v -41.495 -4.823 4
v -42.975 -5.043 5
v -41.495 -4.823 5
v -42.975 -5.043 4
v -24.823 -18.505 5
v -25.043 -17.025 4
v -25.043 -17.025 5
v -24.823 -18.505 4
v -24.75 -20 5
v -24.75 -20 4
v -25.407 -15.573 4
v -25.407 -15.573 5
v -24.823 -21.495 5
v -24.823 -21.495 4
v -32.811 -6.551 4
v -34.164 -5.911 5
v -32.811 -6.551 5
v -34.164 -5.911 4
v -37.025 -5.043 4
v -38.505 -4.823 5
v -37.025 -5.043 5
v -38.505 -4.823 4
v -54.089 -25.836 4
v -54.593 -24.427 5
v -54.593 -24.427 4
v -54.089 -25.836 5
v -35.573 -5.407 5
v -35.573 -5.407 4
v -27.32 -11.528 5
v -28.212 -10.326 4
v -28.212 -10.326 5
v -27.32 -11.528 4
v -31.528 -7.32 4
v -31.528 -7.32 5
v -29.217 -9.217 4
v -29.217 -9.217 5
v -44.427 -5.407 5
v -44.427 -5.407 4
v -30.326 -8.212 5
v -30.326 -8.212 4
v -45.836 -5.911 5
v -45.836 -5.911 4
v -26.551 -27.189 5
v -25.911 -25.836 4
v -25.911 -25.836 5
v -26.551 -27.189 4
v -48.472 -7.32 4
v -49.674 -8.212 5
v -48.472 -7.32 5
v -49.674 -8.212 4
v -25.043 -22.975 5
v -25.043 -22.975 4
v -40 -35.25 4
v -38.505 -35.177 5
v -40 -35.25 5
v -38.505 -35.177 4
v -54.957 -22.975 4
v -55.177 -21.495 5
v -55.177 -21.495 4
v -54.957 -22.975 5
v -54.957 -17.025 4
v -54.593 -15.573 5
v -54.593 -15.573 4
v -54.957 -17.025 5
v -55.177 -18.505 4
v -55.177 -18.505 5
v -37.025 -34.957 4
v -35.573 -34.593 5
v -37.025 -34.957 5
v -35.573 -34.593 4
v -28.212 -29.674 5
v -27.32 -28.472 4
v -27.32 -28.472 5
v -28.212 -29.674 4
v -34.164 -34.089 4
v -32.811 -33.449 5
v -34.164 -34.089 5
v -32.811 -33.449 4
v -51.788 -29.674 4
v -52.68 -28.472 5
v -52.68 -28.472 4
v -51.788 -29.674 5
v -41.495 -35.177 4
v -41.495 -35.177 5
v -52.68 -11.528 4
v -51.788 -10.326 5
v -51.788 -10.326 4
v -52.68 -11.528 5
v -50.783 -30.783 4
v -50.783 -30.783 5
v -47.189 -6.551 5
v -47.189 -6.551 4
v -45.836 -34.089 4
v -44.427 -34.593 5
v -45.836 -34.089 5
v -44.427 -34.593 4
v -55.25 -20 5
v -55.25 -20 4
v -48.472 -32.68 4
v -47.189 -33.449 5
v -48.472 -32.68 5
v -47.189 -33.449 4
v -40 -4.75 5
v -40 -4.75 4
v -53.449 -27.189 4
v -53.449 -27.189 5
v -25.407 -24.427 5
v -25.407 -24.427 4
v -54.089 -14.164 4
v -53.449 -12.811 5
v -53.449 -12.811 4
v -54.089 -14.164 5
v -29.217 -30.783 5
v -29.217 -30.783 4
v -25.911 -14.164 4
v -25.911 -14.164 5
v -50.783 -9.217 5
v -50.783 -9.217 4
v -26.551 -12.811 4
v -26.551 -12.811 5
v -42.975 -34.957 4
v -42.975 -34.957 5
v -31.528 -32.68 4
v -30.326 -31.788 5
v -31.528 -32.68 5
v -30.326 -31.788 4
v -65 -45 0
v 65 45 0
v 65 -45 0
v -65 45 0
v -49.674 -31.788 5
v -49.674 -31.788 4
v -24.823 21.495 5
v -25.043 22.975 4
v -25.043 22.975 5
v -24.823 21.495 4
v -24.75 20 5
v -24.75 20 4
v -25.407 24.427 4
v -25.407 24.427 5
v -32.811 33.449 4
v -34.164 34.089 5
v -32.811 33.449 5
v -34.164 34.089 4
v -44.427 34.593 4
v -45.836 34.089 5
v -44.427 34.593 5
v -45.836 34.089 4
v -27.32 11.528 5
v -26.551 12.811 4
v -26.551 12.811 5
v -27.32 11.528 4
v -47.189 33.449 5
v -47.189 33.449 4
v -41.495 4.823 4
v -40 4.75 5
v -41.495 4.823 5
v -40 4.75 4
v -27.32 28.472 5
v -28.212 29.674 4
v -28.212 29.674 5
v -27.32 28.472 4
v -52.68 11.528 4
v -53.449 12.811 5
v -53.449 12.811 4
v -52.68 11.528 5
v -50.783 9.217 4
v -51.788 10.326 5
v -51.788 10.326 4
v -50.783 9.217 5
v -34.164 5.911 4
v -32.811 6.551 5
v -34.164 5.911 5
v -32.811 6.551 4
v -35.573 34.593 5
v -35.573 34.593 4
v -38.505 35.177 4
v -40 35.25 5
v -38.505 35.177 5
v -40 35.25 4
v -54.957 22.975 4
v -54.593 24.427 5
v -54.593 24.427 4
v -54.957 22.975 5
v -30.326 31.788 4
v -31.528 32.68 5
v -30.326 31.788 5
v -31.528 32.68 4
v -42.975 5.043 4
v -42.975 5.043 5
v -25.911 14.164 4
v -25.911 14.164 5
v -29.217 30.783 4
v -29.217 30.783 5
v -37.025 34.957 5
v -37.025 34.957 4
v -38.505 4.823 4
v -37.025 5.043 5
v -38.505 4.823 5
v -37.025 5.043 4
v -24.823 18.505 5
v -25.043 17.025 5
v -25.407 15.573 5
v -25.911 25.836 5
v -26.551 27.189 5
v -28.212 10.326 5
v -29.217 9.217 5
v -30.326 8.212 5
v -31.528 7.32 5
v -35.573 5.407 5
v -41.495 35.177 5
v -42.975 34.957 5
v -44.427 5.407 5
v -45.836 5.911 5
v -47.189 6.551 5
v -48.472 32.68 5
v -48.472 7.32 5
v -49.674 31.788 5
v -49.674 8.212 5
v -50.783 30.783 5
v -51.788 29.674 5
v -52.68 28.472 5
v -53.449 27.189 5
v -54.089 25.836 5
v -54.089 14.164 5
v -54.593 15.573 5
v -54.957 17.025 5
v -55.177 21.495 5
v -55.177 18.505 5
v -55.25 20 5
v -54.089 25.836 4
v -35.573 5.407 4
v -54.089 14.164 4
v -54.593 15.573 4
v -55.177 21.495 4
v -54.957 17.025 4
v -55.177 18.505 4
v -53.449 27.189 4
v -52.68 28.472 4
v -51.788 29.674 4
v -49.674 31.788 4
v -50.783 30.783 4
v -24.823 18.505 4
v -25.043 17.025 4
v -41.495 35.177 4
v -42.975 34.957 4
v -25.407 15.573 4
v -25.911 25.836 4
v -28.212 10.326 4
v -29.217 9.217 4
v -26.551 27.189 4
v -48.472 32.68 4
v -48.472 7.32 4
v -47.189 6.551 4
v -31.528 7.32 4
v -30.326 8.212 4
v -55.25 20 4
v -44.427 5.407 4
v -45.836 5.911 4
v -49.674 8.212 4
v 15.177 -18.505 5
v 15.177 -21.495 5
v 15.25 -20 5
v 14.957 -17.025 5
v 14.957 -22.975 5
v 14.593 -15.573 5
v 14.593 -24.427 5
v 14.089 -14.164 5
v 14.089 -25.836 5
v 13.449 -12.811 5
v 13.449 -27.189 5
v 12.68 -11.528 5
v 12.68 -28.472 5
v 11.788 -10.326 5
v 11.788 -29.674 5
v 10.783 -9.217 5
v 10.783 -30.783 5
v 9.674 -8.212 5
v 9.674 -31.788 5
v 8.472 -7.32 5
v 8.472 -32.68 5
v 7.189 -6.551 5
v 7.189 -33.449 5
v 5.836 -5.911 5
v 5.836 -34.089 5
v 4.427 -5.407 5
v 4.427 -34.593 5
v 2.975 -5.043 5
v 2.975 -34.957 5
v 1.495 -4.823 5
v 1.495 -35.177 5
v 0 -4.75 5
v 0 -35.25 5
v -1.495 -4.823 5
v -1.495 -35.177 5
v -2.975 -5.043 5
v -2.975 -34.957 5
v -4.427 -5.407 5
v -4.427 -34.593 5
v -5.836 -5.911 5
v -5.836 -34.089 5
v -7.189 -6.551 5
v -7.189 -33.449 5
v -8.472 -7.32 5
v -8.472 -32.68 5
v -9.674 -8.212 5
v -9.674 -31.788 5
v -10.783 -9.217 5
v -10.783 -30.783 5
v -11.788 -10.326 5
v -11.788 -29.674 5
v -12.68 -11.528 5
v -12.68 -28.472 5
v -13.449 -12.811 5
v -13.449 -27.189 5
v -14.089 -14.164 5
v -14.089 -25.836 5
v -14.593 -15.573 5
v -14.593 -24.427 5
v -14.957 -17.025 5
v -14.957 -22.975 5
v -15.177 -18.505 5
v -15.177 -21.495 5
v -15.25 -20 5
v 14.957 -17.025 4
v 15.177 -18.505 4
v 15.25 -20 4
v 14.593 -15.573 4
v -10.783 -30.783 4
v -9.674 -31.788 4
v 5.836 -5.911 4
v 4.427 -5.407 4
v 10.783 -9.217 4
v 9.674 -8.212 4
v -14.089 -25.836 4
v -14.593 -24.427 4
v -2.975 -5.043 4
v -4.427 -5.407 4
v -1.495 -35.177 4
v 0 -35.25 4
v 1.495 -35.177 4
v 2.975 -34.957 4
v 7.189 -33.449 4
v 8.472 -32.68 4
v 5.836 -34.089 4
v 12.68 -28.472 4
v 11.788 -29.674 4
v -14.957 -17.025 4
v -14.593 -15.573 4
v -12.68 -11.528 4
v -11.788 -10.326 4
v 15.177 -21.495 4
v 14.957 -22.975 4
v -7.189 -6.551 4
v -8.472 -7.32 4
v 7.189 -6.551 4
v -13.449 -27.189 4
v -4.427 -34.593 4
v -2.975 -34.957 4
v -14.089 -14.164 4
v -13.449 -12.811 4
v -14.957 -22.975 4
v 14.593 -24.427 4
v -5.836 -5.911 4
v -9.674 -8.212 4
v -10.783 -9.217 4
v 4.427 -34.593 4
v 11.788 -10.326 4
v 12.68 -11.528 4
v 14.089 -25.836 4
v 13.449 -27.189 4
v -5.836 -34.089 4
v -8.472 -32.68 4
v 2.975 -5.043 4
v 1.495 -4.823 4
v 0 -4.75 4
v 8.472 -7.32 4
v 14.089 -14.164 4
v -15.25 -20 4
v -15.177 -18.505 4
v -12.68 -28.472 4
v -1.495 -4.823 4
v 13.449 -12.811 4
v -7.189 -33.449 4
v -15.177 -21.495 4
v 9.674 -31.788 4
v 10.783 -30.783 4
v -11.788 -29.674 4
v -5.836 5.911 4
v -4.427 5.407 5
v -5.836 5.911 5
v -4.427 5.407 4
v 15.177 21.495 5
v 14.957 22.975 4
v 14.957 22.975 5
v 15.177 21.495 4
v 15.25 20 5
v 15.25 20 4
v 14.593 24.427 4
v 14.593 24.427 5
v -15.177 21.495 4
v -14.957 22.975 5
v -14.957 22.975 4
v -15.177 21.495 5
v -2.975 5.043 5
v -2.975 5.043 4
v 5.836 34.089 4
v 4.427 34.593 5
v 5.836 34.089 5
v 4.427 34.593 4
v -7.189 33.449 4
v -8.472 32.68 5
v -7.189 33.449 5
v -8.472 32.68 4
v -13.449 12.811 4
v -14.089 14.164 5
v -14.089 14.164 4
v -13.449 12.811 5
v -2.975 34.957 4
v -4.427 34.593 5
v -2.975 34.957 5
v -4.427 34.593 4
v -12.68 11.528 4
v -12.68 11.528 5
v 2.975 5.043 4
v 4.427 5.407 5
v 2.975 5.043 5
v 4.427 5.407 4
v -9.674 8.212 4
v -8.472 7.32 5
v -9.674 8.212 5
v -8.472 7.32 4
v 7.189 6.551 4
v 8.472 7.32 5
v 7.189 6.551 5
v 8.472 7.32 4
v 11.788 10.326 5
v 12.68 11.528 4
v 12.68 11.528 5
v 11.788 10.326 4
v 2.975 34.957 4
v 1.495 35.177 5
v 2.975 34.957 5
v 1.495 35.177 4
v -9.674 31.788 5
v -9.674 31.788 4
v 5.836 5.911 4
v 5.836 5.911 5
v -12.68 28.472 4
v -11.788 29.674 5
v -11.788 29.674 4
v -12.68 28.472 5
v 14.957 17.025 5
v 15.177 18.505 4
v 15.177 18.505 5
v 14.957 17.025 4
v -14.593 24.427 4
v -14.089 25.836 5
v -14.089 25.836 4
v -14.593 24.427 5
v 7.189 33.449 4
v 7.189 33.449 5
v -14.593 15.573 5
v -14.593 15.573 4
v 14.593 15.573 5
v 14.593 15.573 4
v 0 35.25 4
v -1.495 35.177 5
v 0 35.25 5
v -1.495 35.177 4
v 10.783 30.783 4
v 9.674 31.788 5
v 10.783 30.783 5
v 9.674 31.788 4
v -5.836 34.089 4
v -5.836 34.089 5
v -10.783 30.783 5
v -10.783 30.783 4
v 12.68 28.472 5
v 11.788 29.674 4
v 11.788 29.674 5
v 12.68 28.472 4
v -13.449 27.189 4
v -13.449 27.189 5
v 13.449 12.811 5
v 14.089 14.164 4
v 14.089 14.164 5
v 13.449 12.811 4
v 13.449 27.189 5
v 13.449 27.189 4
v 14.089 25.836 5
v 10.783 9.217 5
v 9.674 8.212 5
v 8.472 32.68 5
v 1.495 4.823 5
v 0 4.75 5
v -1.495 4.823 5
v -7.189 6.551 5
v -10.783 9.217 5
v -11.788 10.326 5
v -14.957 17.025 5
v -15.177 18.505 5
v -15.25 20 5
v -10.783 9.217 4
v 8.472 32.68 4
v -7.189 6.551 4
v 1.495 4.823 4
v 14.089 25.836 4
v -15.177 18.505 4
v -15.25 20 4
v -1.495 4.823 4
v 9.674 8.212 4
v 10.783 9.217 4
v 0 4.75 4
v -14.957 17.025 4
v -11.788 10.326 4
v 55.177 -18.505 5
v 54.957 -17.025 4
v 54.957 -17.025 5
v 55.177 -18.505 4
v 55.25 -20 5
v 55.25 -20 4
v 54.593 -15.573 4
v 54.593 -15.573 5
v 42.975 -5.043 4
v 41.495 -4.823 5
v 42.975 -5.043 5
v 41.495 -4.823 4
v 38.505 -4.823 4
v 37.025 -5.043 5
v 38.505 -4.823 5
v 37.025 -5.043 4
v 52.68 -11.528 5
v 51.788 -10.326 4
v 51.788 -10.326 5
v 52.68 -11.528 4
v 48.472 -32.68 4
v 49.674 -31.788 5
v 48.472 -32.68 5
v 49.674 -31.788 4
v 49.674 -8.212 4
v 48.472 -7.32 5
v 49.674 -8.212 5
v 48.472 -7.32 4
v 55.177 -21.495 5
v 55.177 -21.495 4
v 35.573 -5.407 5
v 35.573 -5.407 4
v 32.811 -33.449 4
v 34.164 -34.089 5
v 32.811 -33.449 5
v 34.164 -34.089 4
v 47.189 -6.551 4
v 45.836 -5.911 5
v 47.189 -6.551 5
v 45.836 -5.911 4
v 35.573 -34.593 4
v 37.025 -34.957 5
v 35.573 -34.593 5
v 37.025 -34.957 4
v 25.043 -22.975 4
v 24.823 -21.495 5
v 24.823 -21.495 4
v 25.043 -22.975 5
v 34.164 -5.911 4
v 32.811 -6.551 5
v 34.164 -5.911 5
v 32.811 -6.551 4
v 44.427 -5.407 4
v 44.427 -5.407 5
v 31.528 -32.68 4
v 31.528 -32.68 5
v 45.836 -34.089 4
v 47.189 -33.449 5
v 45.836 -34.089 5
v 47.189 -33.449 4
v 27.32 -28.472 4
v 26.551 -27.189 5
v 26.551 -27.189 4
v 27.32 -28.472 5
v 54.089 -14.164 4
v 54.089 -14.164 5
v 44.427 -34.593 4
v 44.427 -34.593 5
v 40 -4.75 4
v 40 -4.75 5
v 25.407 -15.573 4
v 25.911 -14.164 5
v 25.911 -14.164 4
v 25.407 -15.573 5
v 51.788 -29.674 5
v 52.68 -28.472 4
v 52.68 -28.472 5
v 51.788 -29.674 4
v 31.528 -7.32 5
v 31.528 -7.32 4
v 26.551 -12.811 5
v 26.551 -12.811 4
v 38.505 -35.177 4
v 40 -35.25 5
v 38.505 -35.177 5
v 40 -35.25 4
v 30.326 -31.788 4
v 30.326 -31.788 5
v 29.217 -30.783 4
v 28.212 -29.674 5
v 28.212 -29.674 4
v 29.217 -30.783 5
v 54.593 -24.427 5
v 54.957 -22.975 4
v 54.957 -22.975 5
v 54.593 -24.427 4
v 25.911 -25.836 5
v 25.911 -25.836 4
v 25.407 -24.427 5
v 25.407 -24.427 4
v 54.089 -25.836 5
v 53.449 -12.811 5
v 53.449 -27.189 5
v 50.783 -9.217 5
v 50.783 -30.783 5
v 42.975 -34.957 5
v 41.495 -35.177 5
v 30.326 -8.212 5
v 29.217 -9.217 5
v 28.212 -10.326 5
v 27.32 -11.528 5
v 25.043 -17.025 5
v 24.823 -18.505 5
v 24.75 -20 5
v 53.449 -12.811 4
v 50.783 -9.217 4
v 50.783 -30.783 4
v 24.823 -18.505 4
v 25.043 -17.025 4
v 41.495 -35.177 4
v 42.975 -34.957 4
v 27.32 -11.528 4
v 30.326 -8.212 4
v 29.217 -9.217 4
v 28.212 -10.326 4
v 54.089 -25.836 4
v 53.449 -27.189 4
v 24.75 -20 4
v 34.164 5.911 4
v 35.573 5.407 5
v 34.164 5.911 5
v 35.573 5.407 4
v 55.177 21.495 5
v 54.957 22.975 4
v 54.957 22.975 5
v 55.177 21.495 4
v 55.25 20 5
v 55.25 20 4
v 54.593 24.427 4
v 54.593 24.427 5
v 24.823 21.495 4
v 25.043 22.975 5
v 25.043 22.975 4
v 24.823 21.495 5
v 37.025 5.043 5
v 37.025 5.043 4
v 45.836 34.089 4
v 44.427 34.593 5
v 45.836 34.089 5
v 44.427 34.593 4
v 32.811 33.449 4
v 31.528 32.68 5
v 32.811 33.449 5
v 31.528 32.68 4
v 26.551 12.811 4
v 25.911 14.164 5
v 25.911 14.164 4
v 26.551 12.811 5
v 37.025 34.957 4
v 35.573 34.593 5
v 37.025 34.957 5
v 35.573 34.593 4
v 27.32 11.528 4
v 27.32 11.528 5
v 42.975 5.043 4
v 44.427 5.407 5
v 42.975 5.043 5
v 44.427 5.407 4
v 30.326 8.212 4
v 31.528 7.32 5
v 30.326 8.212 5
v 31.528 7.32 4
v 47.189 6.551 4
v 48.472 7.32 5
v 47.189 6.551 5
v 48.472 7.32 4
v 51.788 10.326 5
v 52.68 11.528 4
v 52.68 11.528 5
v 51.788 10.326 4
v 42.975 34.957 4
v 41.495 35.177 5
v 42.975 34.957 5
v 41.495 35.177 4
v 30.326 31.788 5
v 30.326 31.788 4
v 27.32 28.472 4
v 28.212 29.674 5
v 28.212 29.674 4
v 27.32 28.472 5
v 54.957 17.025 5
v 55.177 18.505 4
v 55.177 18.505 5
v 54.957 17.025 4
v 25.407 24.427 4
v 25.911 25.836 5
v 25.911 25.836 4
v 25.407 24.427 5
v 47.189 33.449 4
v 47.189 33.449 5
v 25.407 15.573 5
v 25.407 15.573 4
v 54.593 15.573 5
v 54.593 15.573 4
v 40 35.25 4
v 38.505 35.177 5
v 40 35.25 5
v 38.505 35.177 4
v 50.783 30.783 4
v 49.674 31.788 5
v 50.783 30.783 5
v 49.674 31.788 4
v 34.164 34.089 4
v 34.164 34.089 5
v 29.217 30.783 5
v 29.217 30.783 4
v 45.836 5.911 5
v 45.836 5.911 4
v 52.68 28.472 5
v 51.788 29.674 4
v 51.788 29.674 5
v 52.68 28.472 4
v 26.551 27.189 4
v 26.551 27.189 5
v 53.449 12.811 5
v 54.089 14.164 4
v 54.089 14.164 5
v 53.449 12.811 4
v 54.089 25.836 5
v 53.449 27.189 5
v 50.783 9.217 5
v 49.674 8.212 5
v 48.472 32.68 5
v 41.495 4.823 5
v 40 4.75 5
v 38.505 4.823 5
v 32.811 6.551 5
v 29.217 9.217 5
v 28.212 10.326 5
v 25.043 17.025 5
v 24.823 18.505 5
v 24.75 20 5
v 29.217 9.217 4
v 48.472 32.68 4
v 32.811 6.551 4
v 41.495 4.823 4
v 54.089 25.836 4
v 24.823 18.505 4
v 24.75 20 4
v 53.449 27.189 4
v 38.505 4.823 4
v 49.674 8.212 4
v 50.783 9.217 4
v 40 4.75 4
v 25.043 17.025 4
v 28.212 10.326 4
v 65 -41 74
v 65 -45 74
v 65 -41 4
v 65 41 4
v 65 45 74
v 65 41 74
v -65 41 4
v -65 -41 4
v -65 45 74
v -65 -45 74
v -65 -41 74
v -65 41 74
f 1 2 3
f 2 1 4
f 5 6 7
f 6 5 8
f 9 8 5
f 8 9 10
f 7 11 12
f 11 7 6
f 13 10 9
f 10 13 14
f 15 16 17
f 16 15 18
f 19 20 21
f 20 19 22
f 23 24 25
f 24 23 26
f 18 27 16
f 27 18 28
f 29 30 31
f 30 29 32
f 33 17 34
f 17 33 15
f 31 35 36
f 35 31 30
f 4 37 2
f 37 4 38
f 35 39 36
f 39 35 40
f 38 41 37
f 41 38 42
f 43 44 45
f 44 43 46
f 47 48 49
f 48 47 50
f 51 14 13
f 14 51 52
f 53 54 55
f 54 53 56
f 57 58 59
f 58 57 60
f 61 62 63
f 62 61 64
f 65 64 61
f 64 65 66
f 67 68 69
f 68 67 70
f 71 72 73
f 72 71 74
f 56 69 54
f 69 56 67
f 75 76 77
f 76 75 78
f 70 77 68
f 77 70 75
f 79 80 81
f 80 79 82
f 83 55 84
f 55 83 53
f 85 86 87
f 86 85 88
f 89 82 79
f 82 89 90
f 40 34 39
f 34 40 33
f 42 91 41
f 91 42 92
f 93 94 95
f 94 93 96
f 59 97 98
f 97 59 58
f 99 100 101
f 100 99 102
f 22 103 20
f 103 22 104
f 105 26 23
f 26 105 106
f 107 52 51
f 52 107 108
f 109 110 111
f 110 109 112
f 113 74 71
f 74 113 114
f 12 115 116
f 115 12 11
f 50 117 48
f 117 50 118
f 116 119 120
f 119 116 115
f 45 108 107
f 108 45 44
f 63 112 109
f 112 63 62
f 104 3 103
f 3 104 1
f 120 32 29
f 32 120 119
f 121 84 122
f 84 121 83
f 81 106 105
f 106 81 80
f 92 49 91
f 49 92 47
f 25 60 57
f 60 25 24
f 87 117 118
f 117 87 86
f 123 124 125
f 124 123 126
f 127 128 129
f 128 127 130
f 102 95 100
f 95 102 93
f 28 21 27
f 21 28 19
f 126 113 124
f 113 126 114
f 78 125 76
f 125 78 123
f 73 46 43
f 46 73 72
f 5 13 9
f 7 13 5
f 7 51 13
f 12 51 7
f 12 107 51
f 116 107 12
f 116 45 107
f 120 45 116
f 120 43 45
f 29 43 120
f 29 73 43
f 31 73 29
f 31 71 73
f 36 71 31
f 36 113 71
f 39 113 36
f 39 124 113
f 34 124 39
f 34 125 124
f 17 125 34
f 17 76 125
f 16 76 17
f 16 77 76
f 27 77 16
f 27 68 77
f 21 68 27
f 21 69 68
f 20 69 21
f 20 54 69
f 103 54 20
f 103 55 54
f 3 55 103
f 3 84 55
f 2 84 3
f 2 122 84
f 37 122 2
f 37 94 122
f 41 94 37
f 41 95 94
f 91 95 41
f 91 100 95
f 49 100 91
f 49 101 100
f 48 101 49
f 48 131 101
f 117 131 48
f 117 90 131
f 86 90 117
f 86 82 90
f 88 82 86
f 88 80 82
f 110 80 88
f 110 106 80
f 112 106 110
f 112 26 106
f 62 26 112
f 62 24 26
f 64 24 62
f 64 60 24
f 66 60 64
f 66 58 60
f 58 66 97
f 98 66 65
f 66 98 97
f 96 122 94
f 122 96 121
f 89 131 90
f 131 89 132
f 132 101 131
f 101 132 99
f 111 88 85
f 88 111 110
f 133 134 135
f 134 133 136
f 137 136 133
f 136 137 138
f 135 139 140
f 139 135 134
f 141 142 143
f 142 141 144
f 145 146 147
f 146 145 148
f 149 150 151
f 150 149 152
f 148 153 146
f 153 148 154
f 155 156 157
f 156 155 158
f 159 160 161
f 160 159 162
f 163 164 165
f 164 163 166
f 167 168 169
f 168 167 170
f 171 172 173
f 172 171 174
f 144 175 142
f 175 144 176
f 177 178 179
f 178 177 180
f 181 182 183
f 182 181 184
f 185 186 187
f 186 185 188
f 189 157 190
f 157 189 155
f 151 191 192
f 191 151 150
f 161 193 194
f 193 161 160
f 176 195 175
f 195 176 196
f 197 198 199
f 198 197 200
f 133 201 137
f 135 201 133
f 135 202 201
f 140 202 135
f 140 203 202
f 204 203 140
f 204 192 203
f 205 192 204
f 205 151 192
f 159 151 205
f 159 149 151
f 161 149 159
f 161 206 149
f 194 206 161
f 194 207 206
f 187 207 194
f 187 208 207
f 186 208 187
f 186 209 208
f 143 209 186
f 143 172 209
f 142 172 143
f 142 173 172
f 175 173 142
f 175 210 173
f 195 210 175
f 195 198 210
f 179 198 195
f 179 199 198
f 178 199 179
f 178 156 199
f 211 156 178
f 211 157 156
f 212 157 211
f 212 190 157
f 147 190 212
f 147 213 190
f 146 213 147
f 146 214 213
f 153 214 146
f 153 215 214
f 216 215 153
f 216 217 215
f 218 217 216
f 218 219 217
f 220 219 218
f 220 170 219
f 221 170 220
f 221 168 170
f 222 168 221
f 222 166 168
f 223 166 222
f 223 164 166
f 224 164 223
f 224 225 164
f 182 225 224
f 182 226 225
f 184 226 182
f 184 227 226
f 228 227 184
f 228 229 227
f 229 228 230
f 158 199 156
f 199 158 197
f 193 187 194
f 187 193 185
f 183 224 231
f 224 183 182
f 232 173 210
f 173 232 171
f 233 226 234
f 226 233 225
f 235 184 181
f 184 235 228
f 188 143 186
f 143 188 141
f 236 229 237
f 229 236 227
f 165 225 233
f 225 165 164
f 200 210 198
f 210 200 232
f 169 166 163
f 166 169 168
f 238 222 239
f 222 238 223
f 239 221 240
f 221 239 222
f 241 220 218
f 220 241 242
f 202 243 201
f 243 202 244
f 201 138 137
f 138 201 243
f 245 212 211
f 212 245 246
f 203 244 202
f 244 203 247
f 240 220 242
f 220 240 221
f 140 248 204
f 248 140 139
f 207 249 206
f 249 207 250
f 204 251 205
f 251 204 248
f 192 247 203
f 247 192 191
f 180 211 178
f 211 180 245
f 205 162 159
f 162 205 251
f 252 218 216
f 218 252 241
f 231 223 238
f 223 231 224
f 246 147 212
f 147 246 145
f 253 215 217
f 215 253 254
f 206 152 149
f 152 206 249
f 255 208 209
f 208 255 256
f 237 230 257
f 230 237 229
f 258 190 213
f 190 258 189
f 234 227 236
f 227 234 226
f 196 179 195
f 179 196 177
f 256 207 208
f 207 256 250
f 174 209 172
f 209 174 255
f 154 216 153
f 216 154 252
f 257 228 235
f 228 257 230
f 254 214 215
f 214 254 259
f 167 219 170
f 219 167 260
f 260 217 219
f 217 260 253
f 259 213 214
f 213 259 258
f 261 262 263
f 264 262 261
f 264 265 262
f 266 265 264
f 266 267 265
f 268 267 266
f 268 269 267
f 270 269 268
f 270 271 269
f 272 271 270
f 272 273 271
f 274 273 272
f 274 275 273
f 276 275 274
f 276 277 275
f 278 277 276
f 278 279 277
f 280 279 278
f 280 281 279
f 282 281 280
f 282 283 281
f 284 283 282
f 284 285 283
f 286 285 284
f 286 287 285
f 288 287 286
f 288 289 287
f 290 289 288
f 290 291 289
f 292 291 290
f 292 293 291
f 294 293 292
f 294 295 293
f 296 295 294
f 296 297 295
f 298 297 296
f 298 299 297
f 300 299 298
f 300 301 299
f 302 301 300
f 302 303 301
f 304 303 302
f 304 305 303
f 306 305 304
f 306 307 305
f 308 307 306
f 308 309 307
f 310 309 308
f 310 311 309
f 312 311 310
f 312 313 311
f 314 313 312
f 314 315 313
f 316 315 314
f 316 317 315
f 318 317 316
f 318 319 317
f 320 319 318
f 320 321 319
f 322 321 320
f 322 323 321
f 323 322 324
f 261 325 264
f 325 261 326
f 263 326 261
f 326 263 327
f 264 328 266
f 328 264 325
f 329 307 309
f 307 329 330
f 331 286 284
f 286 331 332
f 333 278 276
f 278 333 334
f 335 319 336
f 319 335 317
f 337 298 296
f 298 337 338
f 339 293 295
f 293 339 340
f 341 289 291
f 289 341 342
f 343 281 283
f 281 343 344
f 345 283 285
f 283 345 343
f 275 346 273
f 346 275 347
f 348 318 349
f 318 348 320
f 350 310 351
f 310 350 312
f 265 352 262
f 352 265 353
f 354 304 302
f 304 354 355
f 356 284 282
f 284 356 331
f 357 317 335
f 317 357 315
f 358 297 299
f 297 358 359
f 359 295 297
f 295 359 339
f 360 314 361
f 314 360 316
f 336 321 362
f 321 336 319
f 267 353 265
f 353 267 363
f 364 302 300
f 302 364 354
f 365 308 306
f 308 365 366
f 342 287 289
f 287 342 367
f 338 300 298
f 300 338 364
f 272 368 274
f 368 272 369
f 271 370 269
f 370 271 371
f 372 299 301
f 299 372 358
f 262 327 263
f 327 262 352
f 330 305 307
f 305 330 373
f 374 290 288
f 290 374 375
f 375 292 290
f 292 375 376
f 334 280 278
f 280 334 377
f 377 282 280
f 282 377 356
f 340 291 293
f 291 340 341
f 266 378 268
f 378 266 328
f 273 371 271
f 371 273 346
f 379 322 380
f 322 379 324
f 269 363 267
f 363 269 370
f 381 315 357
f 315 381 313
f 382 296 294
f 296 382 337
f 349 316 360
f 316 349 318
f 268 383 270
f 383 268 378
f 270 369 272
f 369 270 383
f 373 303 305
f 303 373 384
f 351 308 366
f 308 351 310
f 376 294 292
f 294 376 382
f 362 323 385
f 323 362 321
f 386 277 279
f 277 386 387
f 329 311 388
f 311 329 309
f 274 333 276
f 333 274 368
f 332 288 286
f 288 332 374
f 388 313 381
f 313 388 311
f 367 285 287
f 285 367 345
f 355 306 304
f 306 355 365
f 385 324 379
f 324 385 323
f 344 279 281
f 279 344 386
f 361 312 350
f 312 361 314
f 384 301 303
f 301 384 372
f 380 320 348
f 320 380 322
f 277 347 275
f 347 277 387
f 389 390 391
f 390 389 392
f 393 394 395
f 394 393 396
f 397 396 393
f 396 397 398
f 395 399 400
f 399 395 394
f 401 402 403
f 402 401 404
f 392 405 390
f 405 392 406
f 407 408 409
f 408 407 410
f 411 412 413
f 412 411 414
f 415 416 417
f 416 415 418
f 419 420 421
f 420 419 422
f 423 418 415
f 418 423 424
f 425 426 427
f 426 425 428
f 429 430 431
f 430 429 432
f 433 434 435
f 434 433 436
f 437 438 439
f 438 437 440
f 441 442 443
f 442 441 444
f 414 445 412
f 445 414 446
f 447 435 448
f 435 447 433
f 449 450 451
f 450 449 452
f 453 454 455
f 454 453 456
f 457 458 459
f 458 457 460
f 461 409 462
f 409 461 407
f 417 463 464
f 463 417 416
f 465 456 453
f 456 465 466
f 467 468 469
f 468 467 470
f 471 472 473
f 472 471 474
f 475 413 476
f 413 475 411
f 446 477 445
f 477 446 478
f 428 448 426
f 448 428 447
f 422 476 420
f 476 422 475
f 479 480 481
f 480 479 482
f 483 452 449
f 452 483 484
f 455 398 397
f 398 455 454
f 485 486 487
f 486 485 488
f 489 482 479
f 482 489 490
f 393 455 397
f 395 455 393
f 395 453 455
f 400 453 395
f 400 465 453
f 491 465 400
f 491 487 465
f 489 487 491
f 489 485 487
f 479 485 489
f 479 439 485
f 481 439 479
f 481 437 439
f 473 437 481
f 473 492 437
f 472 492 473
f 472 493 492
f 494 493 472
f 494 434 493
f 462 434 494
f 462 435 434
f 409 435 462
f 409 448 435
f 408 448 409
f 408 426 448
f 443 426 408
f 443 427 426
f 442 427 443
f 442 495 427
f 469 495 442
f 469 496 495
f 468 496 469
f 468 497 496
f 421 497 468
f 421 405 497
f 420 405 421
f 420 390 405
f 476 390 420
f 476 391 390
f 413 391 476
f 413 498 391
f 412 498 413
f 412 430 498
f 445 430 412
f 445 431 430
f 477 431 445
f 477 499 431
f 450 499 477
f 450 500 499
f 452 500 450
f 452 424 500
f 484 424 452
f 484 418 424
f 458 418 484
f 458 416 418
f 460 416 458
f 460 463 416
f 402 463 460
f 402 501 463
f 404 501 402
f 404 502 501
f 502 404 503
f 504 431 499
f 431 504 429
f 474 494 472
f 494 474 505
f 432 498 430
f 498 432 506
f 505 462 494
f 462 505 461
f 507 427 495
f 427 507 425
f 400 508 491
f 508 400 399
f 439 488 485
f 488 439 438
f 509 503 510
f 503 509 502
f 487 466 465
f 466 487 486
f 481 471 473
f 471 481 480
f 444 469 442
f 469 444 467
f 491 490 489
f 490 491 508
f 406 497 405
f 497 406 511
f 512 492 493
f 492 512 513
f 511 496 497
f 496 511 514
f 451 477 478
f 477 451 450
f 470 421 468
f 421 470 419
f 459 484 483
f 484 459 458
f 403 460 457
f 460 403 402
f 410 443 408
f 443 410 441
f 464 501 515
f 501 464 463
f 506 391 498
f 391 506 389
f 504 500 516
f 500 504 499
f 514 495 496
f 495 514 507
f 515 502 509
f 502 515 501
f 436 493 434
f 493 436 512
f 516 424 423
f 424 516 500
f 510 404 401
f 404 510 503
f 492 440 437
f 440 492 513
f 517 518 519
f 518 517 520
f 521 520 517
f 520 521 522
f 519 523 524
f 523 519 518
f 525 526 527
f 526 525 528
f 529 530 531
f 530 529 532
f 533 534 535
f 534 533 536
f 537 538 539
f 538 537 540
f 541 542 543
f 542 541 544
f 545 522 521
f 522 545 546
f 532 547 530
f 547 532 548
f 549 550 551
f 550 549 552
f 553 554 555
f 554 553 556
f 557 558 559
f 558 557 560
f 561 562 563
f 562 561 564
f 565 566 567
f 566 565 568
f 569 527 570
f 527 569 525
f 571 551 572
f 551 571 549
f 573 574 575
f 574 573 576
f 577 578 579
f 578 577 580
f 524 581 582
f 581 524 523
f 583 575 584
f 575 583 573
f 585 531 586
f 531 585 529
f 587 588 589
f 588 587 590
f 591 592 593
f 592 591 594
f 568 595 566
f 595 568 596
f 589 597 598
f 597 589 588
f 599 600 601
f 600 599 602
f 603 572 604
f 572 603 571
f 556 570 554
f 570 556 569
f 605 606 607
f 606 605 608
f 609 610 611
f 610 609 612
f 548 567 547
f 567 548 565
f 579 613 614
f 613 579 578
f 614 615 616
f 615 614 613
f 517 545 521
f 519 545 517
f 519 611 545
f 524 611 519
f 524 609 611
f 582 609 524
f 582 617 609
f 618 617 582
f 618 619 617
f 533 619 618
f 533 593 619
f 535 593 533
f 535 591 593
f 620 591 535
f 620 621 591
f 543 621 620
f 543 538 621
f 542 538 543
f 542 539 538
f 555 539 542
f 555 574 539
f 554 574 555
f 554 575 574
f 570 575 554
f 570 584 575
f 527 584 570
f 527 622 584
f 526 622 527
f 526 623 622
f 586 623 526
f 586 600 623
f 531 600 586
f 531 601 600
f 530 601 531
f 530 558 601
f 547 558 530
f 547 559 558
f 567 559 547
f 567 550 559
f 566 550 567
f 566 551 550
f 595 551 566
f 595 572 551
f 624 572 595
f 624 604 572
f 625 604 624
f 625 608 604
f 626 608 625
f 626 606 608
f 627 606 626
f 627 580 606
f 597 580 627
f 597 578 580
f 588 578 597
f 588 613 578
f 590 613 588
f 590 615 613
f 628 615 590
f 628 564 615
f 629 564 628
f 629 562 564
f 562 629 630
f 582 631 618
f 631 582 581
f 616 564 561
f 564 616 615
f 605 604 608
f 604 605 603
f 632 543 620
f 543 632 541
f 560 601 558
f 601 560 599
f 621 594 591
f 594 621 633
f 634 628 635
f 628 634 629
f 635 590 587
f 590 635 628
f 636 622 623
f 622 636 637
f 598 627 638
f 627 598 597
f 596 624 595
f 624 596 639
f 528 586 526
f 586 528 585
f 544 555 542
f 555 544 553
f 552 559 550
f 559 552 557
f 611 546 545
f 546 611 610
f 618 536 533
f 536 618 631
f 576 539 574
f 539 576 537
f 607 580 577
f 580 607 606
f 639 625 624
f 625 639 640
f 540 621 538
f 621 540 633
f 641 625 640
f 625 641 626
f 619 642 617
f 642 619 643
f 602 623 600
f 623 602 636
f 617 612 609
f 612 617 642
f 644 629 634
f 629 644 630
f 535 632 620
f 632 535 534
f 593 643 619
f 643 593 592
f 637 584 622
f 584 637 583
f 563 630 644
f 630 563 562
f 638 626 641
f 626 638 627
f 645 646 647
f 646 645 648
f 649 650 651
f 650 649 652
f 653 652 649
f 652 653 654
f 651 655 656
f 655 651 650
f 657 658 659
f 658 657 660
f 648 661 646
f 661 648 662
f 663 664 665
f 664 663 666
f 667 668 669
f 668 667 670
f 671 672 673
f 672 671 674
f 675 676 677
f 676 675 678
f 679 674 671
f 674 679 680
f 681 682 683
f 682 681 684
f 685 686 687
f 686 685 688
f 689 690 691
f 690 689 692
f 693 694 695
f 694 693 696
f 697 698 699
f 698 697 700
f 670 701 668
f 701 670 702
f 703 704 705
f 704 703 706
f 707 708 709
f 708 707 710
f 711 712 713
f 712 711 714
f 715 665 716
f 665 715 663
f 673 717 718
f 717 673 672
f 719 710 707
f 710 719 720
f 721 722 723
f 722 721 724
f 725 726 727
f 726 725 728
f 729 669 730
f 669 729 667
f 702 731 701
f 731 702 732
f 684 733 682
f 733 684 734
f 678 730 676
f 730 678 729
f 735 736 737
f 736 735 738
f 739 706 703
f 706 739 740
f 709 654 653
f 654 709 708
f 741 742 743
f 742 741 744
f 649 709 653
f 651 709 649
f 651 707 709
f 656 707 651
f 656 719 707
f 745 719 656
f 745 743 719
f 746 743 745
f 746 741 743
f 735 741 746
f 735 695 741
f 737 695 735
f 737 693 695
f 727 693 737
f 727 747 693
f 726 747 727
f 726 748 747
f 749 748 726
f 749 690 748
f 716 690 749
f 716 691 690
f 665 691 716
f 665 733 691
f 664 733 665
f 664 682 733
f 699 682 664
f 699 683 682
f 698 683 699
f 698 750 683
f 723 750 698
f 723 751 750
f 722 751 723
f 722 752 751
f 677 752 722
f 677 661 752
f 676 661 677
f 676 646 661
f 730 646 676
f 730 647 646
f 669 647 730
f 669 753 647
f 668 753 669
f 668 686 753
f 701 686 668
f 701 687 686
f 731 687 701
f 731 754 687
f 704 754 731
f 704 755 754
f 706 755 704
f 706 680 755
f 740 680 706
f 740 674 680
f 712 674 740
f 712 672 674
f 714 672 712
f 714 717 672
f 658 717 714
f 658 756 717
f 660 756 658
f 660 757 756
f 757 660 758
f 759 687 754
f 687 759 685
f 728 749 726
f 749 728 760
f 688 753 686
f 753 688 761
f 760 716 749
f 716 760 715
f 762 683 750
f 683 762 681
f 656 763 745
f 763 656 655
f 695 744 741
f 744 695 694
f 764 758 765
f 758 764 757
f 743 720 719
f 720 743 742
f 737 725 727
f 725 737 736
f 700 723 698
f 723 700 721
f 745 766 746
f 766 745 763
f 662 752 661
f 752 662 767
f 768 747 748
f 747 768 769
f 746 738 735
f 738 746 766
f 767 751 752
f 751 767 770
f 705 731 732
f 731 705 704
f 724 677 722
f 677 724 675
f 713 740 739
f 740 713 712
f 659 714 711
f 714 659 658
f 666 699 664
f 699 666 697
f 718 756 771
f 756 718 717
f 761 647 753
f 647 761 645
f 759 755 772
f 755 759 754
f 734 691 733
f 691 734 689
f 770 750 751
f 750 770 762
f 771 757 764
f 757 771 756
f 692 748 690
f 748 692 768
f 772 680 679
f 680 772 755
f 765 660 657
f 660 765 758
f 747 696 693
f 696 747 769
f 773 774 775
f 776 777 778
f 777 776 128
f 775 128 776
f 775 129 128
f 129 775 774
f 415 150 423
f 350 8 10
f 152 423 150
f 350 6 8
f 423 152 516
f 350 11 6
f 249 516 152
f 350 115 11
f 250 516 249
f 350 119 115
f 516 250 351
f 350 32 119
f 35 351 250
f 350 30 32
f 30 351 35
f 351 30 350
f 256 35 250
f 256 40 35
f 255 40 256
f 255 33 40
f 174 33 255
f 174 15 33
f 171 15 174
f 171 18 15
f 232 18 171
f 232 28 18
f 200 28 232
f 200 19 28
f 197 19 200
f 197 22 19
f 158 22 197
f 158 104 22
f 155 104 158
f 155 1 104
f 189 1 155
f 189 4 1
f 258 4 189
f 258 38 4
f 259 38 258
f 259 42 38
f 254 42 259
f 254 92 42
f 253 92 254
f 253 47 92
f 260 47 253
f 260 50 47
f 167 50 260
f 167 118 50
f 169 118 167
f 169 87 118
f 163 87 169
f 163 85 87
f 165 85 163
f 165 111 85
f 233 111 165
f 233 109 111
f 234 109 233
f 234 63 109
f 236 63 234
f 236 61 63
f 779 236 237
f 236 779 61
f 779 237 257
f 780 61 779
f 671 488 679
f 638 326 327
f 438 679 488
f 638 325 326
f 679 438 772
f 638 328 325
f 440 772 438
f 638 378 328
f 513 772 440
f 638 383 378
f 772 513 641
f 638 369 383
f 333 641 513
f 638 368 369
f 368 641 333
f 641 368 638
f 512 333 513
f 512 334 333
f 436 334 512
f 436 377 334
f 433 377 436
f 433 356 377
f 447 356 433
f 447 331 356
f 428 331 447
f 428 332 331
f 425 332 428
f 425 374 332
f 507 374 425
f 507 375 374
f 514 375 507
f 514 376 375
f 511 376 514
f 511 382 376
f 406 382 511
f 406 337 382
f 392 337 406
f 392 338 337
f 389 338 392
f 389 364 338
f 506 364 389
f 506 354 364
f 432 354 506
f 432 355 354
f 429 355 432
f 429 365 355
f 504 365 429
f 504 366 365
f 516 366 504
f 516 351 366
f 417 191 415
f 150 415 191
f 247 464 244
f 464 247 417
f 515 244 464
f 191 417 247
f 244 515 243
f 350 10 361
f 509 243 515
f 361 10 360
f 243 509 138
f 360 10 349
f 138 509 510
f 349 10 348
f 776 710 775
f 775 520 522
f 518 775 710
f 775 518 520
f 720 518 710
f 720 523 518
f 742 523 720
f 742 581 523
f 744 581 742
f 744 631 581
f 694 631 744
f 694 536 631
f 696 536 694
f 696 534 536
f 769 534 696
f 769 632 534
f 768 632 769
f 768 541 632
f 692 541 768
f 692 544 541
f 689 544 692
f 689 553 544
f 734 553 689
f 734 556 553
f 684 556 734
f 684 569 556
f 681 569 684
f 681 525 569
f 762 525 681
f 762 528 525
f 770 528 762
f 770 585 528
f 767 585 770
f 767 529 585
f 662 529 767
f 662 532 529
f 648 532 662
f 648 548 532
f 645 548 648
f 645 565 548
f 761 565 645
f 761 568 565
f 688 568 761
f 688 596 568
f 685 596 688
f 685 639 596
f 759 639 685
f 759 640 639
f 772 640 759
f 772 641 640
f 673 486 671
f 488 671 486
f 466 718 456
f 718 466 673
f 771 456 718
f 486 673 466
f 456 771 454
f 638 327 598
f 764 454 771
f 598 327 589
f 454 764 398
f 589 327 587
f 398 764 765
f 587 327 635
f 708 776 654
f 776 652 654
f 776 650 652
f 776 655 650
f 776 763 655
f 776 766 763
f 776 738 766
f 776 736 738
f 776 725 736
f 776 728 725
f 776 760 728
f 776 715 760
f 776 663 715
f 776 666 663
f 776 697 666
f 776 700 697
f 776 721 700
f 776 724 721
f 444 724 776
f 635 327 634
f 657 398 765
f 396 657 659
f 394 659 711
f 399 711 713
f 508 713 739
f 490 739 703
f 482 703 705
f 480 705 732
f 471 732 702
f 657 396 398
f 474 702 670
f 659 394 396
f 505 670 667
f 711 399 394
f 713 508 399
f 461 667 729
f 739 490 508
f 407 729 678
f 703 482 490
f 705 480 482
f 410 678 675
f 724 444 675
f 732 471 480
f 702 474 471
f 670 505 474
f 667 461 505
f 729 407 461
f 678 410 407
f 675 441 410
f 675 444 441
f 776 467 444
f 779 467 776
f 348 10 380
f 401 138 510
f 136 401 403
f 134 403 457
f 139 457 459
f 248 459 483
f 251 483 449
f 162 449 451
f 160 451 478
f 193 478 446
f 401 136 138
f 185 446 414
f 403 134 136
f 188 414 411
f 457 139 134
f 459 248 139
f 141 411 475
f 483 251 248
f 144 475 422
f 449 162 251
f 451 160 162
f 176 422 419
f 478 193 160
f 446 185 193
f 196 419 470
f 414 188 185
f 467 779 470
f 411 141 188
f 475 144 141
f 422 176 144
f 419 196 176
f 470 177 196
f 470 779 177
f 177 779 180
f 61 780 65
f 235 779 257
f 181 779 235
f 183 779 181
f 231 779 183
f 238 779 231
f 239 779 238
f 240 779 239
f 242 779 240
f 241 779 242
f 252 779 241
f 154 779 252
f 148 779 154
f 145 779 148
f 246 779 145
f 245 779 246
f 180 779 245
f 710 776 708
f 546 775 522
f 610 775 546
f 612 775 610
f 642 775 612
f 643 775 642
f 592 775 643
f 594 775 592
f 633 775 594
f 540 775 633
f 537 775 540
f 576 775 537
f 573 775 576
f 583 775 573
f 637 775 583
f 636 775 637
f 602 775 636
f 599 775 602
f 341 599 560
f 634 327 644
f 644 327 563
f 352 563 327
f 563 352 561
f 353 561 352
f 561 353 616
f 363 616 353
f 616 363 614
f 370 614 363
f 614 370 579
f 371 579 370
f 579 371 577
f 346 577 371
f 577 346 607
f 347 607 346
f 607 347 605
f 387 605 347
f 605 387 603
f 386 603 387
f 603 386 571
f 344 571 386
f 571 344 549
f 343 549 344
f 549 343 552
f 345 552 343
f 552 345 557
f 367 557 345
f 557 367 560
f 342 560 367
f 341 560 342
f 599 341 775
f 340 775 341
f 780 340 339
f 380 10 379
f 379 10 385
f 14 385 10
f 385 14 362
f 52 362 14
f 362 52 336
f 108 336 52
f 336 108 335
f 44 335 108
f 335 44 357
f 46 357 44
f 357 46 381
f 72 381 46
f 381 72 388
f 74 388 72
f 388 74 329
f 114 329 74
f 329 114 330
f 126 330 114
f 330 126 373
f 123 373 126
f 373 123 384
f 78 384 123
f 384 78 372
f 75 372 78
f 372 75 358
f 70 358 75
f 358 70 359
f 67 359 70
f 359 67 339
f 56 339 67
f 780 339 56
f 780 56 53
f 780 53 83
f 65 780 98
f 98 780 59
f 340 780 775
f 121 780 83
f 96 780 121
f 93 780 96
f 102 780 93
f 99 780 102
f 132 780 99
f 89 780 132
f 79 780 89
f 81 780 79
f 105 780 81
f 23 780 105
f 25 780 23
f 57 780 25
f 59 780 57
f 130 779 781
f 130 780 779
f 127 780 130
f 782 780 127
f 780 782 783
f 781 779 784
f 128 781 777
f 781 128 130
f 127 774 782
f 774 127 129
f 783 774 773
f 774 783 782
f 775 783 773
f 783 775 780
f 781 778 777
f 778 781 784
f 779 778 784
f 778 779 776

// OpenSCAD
// Rack for six 50 mL conical tubes.
// Print orientation: Flat plate on bed (z=0), walls rising to z=70.
// After printing, flip over so walls stand on the bed and tubes hang down.

// Plate dimensions
L     = 130; // Length (X)
W     = 90;  // Width (Y)
t     = 4;   // Plate thickness (Z)

// Hole dimensions and layout
n_rows = 2; // Rows along Y
n_cols = 3; // Columns along X
hole_d = 30.5; // Hole diameter
c_x    = 40;   // Centre-to-centre spacing X
c_y    = 40;   // Centre-to-centre spacing Y

// Wall dimensions
wall_h = 70; // Wall height (from plate top)
wall_t = 4;  // Wall thickness (Y)

// Derived positions
// Centres are calculated to be symmetric around the origin
// X positions: -60, 0, 60 (since 3 cols, spacing 40, total span 120, centred at 0)
// Y positions: -45, 45 (since 2 rows, spacing 40, total span 80, centred at 0)
// Note: The prompt says "2 rows ... of 3 ... 40 mm centre-to-centre in both directions".
// If total width is 90 and spacing is 40, the range is 80. 
// Positions: -40, 0, 40 would give 80 span. 
// However, "2 rows of 3" usually implies a grid. 
// Let's re-read: "2 rows (along Y) of 3 (along X)".
// This means 3 columns along X, 2 rows along Y.
// Spacing 40 in both directions.
// X coords: -40, 0, 40.
// Y coords: -40, 0, 40? No, that would be 3 rows.
// With 2 rows and spacing 40, the distance between row centers is 40.
// To center a 40mm span in a 90mm width: (90-40)/2 = 25mm offset from edge.
// So Y coords: -20, +20? No, spacing is 40.
// Let's assume the grid is defined by the spacing and count, then centered.
// X: 3 items, spacing 40. Range = 2 * 40 = 80. Centered in 130 -> offset 25.
//    Pos: -25-40=-65, -25, -25+40=15? No.
//    Standard centering: items at -40, 0, 40. Span 80. Center 0.
// Y: 2 items, spacing 40. Range = 1 * 40 = 40. Centered in 90 -> offset 25.
//    Pos: -20, +20. Span 40. Center 0.
// Let's verify the prompt's "40 mm centre-to-centre in both directions".
// If X spacing is 40 and Y spacing is 40.
// X positions: -40, 0, 40.
// Y positions: -20, 20. (Distance is 40).
// This fits the "2 rows of 3" description perfectly.

// Calculate specific coordinates for the loop
// X positions: -40, 0, 40
// Y positions: -20, 20

$fn = 64;

module rack() {
    // 1. The Base Plate
    // Flat plate 130x90x4, centered on origin, sitting on z=0.
    translate([-L/2, -W/2, 0]) cube([L, W, t]);

    // 2. The Through-Holes
    // 6 holes, 30.5mm diameter.
    // Grid: 3 columns (X), 2 rows (Y).
    // Spacing: 40mm in both directions.
    // X coords: -40, 0, 40
    // Y coords: -20, 20
    
    for (i = [-1, 0, 1]) {
        for (j = [-1, 0]) {
            // Calculate X and Y based on loop indices
            // i: -1, 0, 1 -> X: -40, 0, 40
            // j: -1, 0   -> Y: -20, 20
            x_pos = i * 40;
            y_pos = (j + 0.5) * 40; // -0.5*40 = -20, 0.5*40 = 20
            
            translate([x_pos, y_pos, 0]) {
                cylinder(h = t + 1, d = hole_d); // Extend slightly past plate
            }
        }
    }

    // 3. The Side Walls
    // Two walls along the long edges (X axis).
    // Length 130 (X), Thickness 4 (Y).
    // Rise from plate top (z=4) to z=70. Total height from bed = 74.
    // They are flush with the plate's long edge.
    // Plate Y range: -45 to 45.
    // Left wall: at Y = -45.
    // Right wall: at Y = 45.
    
    // Left Wall
    translate([-L/2, -W/2, 0]) cube([L, wall_t, wall_h + t]);
    
    // Right Wall
    translate([-L/2, W/2 - wall_t, 0]) cube([L, wall_t, wall_h + t]);
}

rack();
